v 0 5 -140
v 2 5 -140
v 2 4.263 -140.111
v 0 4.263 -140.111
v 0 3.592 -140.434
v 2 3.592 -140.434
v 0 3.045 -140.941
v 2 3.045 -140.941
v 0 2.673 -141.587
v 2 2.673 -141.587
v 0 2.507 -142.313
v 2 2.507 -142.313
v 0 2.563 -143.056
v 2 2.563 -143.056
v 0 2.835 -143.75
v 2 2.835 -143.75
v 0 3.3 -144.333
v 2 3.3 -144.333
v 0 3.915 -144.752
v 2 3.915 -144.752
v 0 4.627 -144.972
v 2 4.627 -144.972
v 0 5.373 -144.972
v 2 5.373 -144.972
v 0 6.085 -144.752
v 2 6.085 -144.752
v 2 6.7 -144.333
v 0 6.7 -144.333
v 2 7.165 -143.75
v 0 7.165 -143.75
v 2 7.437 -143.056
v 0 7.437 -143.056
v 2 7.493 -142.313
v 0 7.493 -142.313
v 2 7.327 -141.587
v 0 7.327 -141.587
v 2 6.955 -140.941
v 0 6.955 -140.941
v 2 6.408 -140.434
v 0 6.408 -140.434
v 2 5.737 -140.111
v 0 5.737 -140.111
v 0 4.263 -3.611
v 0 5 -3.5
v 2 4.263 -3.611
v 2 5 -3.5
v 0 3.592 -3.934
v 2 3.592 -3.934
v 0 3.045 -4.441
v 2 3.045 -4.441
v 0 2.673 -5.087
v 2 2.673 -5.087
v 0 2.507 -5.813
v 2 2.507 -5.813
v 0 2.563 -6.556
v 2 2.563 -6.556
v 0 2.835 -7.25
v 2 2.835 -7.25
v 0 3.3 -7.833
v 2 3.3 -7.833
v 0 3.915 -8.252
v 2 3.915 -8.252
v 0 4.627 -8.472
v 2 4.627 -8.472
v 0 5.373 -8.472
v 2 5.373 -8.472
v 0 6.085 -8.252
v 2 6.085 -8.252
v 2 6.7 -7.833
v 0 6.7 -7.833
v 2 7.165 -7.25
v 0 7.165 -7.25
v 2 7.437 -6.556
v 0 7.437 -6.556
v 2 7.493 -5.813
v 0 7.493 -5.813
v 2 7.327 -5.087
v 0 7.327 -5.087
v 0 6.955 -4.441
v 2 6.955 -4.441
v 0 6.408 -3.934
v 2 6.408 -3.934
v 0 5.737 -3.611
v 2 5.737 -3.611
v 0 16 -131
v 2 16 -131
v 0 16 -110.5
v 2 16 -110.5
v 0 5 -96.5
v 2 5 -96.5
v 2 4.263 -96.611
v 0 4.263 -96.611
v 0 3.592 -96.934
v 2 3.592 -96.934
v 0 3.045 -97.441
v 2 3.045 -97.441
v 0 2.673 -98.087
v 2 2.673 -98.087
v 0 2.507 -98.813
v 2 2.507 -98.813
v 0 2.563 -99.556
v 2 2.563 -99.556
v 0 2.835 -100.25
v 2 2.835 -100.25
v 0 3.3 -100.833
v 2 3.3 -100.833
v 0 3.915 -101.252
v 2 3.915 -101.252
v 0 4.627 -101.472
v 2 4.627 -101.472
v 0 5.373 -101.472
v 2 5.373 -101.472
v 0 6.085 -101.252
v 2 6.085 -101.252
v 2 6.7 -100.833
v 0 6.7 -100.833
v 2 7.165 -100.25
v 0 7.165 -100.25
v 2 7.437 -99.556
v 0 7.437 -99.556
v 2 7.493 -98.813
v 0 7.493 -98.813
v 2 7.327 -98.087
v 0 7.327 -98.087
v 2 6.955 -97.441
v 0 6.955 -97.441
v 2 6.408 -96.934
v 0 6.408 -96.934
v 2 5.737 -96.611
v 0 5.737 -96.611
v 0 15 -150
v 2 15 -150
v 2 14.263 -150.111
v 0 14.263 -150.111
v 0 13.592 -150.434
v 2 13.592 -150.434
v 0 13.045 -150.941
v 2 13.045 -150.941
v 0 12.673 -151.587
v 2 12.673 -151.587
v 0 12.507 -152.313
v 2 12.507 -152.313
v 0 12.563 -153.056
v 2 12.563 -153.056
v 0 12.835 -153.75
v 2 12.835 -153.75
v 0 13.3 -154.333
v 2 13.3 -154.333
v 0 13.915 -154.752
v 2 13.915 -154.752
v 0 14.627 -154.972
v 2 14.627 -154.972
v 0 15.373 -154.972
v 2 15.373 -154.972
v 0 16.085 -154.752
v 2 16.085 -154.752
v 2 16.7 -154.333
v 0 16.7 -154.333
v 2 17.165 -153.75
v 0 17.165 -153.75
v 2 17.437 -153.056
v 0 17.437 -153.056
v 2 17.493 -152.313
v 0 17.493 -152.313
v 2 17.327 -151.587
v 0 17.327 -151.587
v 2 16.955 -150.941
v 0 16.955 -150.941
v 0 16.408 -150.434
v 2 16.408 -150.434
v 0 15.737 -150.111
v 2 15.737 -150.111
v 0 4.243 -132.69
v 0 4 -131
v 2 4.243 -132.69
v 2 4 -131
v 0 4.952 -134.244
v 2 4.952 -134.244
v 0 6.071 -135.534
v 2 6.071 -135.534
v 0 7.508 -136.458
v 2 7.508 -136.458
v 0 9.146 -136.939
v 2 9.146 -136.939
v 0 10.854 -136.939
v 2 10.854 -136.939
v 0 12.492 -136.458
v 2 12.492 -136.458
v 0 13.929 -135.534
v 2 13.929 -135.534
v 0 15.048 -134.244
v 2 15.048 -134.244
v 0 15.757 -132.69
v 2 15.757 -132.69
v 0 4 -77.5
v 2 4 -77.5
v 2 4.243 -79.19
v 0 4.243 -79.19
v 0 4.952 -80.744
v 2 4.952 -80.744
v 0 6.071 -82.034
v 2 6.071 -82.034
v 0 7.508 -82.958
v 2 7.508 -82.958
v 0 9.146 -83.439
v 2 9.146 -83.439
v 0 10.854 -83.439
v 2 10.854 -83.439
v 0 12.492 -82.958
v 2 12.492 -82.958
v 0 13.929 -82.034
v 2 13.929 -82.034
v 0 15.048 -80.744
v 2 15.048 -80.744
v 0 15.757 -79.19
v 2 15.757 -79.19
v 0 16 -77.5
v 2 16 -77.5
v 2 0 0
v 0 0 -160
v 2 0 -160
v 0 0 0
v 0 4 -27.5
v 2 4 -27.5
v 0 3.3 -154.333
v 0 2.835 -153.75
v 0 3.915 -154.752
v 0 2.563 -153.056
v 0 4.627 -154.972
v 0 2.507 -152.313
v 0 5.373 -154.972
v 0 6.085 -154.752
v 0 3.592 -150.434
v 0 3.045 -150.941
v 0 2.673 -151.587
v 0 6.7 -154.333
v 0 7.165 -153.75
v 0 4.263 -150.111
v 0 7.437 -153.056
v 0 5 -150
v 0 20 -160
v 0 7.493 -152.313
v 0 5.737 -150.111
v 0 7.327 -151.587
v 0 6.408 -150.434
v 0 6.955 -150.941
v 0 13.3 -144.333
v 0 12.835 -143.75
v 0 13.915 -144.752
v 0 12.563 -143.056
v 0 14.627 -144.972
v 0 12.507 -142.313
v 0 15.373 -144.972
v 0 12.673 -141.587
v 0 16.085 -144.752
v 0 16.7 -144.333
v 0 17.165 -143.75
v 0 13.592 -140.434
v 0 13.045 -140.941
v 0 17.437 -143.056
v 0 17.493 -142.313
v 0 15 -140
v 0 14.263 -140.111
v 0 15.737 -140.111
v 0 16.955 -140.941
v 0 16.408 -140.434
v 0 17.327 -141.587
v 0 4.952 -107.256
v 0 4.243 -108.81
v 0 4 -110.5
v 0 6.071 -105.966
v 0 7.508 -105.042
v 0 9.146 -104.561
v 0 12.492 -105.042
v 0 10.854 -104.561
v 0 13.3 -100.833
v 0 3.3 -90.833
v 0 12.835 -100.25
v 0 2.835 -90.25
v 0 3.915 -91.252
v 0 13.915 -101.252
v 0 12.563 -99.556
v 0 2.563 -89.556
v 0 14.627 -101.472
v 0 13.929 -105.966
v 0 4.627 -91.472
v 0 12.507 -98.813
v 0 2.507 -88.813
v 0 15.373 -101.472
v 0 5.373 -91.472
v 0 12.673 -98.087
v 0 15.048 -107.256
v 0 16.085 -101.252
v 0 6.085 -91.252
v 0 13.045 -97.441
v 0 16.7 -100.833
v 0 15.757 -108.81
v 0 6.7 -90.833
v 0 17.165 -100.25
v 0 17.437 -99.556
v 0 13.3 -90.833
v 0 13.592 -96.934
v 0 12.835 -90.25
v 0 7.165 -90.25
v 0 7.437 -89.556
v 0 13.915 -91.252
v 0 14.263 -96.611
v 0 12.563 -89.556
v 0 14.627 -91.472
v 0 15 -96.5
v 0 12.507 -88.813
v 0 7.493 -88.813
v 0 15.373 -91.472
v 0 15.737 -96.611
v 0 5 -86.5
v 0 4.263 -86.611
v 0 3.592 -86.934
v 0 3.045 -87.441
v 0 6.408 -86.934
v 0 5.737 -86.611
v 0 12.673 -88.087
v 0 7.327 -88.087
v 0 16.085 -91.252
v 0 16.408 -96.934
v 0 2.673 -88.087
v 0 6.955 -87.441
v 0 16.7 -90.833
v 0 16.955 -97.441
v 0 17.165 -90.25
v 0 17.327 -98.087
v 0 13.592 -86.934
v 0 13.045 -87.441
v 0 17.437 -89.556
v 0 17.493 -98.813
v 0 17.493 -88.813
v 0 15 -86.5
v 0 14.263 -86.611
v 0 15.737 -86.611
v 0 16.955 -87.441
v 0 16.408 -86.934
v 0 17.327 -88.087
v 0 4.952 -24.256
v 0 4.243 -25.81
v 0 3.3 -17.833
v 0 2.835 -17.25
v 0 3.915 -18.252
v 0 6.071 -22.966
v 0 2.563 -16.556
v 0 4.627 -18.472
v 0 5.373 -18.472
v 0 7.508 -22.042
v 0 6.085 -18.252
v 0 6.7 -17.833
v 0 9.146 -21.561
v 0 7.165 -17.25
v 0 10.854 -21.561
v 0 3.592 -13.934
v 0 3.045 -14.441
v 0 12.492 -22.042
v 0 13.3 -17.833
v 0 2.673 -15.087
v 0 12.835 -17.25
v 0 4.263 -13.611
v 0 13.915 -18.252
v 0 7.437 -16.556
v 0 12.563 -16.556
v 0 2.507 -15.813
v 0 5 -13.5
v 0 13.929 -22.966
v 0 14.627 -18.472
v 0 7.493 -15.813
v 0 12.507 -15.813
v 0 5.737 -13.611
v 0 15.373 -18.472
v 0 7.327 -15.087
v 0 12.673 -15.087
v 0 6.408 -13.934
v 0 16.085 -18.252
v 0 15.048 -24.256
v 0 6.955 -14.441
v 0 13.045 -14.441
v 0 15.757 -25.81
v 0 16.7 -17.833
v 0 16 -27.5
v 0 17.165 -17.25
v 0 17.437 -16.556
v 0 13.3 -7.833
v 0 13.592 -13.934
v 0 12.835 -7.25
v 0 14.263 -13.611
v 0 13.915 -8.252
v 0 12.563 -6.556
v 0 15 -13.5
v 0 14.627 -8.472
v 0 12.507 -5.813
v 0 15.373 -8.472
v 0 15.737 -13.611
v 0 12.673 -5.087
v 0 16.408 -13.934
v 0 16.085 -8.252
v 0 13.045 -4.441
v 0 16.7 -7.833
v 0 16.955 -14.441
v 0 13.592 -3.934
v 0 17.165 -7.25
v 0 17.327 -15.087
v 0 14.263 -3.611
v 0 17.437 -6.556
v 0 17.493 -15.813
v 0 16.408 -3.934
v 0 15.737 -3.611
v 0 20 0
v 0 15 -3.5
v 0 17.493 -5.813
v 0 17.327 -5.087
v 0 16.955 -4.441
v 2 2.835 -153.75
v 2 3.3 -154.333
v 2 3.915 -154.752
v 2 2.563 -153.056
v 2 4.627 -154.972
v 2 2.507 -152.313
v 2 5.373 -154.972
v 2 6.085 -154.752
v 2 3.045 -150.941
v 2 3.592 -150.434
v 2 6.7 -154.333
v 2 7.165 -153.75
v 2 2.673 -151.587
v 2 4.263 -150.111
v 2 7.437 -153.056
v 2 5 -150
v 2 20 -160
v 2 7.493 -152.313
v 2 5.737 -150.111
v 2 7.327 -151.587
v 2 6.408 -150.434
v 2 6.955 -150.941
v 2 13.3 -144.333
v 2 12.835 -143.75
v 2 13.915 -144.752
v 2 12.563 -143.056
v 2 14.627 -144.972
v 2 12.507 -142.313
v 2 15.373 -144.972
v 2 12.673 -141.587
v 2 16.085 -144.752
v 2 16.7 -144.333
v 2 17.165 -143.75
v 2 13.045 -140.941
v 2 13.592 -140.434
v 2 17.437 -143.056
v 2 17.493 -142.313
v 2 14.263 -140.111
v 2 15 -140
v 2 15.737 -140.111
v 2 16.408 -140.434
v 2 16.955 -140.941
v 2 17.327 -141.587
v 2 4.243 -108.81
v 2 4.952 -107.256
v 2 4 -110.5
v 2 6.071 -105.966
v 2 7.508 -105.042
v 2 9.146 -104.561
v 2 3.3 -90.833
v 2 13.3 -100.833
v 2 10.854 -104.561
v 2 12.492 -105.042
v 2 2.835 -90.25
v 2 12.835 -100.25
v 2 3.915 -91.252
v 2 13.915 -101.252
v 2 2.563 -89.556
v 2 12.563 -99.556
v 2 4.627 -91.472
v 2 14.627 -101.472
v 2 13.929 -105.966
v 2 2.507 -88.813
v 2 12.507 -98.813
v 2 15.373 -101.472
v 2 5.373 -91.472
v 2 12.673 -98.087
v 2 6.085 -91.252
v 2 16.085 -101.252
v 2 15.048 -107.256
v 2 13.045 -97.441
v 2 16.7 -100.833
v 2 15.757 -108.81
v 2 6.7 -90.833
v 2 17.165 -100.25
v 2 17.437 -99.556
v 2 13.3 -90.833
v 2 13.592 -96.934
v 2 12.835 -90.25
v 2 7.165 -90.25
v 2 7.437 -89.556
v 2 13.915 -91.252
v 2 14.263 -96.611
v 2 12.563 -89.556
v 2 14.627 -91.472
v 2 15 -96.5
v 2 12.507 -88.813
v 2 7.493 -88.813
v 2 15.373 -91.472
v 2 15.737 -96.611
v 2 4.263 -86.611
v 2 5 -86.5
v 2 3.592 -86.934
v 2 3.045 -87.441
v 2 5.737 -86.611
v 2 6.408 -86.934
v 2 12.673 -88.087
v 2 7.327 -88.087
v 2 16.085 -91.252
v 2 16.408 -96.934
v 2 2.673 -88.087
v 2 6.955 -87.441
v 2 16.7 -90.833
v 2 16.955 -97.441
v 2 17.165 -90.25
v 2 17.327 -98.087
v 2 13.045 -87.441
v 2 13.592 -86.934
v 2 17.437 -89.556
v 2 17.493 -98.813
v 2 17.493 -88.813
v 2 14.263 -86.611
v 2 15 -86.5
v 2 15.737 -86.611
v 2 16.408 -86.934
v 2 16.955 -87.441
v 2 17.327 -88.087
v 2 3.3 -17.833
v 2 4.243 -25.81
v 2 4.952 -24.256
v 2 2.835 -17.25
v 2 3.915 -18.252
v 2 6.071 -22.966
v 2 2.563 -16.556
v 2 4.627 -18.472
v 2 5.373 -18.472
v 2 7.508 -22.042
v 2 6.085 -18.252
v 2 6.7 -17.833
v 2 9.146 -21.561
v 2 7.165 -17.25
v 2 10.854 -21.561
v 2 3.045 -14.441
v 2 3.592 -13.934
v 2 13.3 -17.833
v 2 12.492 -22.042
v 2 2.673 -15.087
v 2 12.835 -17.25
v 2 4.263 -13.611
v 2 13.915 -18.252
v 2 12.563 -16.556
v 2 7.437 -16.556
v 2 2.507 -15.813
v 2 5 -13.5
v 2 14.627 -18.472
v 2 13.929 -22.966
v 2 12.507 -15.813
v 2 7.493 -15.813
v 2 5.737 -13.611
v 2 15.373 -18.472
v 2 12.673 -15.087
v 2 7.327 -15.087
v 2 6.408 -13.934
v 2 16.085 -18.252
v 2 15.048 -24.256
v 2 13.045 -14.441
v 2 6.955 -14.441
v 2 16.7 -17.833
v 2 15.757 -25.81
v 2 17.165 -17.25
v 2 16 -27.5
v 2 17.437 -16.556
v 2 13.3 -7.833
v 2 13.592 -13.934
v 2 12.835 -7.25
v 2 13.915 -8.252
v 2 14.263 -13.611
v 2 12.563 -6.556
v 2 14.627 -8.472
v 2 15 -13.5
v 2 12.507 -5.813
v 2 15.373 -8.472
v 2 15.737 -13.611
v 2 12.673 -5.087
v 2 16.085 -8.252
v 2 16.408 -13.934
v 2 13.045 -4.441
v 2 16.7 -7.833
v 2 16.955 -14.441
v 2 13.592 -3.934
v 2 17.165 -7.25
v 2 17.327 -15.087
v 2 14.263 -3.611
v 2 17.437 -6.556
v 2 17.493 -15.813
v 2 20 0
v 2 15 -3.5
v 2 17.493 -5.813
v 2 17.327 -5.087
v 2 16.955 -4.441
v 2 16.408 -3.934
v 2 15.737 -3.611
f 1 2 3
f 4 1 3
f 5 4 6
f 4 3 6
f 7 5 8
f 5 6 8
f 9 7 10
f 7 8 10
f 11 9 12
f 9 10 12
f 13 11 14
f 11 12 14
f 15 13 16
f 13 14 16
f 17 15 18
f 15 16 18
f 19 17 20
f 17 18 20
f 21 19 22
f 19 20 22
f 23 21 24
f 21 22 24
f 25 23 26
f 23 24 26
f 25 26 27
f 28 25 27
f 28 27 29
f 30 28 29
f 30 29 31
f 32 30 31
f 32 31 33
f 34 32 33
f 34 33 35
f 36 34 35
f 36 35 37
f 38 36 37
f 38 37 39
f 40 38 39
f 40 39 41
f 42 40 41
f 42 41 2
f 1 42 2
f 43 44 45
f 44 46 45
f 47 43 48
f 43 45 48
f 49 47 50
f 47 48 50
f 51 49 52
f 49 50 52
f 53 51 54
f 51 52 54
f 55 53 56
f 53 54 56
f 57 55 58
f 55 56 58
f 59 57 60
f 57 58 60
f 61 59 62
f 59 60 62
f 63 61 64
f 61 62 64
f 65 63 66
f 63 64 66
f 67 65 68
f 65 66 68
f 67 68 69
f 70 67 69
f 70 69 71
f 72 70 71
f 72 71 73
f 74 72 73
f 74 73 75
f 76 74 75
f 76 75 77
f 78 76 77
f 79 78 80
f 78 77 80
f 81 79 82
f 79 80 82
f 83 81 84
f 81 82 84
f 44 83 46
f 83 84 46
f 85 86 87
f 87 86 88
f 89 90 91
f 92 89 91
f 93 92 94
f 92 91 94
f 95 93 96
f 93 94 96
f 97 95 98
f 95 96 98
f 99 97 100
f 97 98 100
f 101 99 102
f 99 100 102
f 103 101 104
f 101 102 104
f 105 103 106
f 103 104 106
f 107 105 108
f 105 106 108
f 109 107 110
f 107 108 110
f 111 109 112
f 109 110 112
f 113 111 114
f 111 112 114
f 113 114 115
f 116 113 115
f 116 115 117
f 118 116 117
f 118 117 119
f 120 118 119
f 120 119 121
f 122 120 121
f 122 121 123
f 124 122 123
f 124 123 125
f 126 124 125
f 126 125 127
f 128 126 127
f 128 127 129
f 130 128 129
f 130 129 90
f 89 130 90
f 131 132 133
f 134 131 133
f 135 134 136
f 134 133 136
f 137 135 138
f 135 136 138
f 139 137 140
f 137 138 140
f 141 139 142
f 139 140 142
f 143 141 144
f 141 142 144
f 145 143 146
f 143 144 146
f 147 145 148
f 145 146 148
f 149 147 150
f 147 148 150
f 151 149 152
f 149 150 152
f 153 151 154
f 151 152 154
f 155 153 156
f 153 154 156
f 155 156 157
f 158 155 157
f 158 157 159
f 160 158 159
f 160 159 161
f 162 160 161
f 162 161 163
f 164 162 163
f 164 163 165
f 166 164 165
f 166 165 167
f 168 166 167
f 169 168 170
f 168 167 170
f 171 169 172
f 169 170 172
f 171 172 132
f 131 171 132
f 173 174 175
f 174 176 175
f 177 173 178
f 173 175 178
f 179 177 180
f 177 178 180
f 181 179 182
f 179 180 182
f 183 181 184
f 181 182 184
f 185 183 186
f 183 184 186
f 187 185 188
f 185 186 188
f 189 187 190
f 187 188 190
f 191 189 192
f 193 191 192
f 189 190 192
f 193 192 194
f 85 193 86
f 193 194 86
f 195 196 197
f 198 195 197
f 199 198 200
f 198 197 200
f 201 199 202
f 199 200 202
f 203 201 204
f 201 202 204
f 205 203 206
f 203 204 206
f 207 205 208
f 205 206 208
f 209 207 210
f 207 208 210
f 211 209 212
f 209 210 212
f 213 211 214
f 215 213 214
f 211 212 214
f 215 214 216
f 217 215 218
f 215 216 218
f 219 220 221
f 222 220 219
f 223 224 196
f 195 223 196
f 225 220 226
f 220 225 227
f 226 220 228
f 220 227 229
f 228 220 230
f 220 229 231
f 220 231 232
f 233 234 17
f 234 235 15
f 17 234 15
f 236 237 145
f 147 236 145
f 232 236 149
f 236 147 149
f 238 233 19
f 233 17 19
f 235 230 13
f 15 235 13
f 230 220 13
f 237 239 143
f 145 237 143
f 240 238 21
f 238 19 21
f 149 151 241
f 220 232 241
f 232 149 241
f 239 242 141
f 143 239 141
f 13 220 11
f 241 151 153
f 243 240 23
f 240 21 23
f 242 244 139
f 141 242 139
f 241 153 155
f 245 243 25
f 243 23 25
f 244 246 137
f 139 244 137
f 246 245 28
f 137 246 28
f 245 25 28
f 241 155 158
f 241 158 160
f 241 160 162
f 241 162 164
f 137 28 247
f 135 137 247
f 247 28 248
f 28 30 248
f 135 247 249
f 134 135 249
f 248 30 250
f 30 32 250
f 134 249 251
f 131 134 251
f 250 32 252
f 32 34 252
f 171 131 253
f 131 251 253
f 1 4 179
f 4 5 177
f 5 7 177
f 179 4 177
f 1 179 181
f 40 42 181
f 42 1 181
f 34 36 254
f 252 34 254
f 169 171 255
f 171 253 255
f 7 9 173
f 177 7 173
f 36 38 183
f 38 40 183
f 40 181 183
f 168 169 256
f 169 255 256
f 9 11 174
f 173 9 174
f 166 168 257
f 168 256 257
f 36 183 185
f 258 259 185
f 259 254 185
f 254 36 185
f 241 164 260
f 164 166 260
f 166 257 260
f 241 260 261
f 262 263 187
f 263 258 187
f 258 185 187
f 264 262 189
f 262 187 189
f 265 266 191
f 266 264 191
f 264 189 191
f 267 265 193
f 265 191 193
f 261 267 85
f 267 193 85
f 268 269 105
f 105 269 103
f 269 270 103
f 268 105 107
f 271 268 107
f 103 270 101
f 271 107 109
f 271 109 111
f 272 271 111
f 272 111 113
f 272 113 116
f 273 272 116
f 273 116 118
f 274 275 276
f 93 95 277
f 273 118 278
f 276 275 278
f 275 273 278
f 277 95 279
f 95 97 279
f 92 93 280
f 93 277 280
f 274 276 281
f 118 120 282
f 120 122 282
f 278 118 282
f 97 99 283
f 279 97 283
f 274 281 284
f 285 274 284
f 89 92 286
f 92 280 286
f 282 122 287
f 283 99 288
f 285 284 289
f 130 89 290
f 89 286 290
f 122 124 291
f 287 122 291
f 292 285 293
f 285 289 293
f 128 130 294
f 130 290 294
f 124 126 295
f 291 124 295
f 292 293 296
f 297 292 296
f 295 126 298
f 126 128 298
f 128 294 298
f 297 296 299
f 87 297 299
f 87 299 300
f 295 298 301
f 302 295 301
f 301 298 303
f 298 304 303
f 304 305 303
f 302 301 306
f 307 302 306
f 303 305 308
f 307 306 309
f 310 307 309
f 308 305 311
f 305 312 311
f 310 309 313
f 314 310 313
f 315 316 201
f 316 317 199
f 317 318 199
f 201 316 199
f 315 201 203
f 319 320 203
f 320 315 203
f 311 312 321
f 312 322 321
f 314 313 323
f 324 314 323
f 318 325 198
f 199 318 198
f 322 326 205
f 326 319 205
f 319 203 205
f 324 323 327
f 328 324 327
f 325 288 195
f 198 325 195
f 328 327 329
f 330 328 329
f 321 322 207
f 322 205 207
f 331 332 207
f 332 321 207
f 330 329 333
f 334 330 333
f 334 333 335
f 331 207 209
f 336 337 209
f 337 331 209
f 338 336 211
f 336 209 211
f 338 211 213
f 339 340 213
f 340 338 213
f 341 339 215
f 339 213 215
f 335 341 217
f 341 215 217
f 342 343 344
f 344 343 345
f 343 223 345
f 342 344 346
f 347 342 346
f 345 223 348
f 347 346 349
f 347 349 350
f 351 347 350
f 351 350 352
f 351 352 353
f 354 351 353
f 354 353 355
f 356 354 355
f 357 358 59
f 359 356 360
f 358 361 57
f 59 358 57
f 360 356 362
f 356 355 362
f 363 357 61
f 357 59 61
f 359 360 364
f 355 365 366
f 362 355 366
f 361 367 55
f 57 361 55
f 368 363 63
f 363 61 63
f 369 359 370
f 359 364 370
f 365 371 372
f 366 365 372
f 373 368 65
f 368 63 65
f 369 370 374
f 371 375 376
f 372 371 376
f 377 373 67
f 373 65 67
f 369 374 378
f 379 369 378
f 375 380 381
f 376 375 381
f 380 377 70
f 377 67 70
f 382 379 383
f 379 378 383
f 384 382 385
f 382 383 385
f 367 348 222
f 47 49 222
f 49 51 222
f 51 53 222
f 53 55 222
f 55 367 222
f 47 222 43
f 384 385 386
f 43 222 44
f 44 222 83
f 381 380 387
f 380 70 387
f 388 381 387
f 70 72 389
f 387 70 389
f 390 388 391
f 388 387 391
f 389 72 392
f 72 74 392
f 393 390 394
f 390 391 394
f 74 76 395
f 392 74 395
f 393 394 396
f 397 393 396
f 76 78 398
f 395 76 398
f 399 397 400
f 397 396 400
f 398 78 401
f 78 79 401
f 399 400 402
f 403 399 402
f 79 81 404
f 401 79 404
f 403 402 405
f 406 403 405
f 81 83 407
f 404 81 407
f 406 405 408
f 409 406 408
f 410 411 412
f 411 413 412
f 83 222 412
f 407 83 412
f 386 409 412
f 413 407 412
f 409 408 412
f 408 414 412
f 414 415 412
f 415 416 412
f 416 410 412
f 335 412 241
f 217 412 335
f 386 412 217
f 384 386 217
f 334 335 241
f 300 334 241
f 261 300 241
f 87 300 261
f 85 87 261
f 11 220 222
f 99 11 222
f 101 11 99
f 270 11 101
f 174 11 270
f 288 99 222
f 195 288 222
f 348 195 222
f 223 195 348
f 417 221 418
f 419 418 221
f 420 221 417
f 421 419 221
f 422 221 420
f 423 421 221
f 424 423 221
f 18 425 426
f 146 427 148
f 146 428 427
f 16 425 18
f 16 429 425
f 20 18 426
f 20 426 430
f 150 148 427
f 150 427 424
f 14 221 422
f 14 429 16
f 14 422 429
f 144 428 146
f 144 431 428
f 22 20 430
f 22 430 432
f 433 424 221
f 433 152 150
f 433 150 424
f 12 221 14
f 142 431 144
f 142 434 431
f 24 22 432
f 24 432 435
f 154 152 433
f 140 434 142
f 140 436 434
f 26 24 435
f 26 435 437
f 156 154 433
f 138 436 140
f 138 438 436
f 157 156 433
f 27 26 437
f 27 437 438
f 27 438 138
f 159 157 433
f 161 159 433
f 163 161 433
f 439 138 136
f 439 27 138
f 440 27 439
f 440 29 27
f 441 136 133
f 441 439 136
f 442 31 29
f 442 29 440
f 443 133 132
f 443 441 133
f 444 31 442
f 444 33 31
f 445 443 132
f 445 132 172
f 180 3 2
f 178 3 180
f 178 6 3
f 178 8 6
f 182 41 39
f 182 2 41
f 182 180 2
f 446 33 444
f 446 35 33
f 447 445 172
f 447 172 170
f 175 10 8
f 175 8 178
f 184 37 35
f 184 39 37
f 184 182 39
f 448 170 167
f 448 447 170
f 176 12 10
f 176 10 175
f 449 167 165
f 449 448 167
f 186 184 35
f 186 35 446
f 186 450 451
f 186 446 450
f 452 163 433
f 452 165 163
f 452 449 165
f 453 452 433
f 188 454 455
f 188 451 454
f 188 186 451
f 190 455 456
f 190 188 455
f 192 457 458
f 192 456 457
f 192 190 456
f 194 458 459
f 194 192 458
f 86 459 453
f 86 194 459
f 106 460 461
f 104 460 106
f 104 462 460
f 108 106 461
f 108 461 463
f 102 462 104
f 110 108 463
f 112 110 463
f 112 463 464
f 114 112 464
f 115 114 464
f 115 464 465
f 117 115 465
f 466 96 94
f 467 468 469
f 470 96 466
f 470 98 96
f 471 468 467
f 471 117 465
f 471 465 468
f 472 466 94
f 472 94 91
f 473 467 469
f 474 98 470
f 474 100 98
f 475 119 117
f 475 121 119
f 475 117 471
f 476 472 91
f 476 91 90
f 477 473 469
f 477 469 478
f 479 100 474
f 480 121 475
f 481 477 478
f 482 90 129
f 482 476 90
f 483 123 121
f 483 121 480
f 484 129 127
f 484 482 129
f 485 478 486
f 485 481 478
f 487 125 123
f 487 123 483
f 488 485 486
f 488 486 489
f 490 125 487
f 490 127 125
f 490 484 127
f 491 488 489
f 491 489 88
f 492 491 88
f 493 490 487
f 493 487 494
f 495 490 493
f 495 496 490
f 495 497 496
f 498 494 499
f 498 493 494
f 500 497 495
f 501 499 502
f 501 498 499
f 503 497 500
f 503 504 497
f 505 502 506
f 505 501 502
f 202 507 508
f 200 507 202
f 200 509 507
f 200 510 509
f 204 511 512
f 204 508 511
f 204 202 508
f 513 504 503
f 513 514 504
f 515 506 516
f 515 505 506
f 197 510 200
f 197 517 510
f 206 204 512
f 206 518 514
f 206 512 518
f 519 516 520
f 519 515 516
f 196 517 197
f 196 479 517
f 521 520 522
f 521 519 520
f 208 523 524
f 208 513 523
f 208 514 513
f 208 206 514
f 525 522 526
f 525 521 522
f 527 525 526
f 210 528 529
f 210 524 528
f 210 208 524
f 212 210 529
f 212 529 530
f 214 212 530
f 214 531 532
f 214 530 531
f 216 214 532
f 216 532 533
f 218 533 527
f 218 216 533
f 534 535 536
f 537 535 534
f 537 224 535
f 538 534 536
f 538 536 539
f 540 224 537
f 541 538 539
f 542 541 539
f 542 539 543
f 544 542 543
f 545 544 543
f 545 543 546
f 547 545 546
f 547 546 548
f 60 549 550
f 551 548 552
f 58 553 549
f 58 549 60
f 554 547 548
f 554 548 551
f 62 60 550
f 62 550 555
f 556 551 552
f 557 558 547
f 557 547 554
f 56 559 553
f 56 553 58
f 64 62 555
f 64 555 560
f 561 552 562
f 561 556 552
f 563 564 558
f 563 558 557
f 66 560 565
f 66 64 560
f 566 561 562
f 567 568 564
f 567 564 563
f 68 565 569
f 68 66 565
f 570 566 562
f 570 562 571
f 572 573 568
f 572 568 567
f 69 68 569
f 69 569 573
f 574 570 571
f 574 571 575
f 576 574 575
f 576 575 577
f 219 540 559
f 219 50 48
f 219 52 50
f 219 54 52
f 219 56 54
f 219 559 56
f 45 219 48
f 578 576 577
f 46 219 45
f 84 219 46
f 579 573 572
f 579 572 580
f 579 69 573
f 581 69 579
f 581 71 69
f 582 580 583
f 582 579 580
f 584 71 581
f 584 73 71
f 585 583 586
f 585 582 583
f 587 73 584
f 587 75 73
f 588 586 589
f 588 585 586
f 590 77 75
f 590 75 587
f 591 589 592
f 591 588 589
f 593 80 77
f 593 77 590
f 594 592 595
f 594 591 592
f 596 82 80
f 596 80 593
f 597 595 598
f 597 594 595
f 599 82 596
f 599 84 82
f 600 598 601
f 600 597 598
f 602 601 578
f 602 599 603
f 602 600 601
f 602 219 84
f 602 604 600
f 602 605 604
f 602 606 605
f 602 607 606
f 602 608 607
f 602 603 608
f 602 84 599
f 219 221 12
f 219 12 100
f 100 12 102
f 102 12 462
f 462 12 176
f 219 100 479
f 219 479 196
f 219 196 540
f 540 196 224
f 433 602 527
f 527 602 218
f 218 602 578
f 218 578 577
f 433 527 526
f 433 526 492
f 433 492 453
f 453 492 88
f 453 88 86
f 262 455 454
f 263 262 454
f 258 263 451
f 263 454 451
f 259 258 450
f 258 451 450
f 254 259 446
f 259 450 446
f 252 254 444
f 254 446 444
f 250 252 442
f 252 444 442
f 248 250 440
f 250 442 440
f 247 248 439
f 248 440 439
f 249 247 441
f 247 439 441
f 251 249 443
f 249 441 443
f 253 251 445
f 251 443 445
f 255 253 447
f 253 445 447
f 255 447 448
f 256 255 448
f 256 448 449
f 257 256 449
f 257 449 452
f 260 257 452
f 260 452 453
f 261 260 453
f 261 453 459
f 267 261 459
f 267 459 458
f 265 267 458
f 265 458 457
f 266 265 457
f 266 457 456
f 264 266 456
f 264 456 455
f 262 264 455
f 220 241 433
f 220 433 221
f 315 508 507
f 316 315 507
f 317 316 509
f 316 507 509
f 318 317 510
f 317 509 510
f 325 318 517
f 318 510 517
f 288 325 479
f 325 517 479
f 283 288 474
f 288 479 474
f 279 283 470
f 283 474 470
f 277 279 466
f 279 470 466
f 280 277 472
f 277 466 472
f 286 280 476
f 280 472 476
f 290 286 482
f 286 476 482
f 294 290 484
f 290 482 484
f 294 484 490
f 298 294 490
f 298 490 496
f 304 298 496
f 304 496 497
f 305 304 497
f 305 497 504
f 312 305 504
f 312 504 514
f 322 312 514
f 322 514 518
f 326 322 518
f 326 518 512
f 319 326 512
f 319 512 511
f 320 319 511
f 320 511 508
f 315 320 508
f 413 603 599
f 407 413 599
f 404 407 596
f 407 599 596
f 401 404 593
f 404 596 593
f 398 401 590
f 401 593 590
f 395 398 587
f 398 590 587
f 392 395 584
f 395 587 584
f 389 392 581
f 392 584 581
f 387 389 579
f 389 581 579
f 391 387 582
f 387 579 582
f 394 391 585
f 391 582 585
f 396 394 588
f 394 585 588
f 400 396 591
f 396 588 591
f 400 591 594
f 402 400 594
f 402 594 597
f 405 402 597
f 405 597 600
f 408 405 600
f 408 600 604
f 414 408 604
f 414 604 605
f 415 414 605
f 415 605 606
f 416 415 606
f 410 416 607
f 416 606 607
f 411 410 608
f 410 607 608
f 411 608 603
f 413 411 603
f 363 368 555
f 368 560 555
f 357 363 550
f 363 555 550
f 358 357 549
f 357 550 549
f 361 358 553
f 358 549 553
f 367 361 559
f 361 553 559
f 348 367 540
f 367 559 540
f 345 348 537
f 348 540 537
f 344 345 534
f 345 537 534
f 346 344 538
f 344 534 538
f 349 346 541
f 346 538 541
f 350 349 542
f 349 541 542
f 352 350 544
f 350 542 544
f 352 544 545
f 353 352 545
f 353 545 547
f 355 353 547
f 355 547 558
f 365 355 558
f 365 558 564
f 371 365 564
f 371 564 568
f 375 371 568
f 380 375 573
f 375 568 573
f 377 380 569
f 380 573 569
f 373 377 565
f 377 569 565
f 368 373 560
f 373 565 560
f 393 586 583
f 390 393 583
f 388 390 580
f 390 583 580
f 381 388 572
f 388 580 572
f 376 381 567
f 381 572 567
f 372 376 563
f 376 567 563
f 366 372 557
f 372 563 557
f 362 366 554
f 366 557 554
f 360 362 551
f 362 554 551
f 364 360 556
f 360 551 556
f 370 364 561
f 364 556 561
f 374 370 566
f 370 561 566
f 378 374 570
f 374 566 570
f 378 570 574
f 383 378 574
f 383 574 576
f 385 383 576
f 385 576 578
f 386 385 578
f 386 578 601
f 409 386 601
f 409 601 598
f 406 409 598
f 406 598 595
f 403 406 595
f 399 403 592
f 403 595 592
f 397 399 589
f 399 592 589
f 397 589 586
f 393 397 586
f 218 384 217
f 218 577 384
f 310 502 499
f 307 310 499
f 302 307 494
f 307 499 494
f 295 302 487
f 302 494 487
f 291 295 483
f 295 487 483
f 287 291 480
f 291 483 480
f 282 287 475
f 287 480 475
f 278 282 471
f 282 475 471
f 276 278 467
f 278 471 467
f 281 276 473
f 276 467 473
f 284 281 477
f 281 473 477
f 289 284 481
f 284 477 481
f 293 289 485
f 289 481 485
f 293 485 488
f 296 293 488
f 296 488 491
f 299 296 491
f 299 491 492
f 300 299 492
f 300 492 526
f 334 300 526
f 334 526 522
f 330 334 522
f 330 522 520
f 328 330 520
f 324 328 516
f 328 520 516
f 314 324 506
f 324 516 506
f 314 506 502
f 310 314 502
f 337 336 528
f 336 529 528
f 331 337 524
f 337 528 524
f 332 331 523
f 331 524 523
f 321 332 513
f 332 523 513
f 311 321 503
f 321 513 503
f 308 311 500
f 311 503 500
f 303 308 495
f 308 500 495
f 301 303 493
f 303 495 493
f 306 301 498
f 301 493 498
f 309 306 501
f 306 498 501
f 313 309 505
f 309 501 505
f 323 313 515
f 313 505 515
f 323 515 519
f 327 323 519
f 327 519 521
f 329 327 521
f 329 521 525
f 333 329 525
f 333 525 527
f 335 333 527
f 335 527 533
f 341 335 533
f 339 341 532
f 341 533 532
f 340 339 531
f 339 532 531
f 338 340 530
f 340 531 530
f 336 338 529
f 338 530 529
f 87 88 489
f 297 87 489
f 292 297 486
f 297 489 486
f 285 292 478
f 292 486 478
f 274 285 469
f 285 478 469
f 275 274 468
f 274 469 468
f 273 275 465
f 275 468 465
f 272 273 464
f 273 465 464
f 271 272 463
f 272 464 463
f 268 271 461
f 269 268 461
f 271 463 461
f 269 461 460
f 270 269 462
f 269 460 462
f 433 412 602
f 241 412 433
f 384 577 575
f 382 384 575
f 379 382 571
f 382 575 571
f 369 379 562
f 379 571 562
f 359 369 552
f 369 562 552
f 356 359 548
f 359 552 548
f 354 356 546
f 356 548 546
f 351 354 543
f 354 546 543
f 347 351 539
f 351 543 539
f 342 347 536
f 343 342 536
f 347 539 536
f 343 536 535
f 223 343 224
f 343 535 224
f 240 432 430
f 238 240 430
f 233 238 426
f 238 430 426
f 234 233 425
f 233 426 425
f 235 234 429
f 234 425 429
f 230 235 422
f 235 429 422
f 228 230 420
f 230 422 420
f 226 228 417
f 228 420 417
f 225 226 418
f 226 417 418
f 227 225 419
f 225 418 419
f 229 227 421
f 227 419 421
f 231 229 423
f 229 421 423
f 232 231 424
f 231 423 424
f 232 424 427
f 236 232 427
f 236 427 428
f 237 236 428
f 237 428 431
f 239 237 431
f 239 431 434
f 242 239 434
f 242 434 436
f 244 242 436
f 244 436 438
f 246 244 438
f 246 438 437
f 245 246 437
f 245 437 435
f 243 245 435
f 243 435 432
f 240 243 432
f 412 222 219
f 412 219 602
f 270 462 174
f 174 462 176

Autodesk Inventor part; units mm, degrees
ref_plane "YZ Plane" through (0, 0, 0) normal (1, 0, 0) x (0, 1, 0)
ref_plane "XZ Plane" through (0, 0, 0) normal (0, 1, 0) x (-1, 0, 0)
ref_plane "XY Plane" through (0, 0, 0) normal (0, 0, 1) x (1, 0, 0)
sketch "Sketch1" plane through (0, 0, 0) normal (1, 0, 0) x (0, 1, 0)
  line L0 (0, 0) -> (20, 0)
  line L1 (20, 0) -> (20, -160)
  line L2 (20, -160) -> (0, -160)
  line L3 (0, -160) -> (0, 0)
  line L4 (10, 0) -> (10, -160) construction
  line L5 (20, -6) -> (0, -6) construction
  line L6 (20, -16) -> (0, -16) construction
  line L7 (20, -142.5) -> (0, -142.5) construction
  line L8 (25, -152.5) -> (0, -152.5) construction
  line L9 (20, -89) -> (0, -89) construction
  line L10 (25, -99) -> (0, -99) construction
  point P0 (15, -16)
  point P1 (15, -6)
  point P2 (5, -16)
  point P3 (5, -6)
  point P4 (15, -152.5)
  point P5 (15, -142.5)
  point P6 (5, -142.5)
  point P7 (5, -152.5)
  point P8 (15, -99)
  point P9 (15, -89)
  point P10 (5, -89)
  point P11 (5, -99)
  dimension "d1" = 20
  dimension "d10" = 6
  dimension "d11" = 10
  dimension "d12" = 10
  dimension "d13" = 10
  dimension "d14" = 10
  dimension "d16" = 10
  dimension "d17" = 10
  dimension "d27" = 10
  dimension "d28" = 10
  dimension "d29" = 10
  dimension "d30" = 89
  dimension "d40" = 142.5
  dimension "d41" = 160
extrude "Extrusion1" add sketch "Sketch1" along normal blind 2
hole "Hole1" at (0, 15, -16) at (0, 15, -6) at (0, 5, -16) at (0, 5, -6) at (0, 15, -142.5) at (0, 15, -152.5) at (0, 5, -152.5) at (0, 5, -142.5) at (0, 15, -89) at (0, 15, -99) at (0, 5, -99) at (0, 5, -89) direction (1, 0, 0) diameter 5 end through all
sketch "Sketch2" plane through (2, 0, 0) normal (1, 0, 0) x (0, 0, -1)
  arc A0 (27.5, 16) -> (27.5, 4) centre (27.5, 10) ccw
  line L0 (27.5, 10) -> (27.5, 4) construction
  line L1 (27.5, 10) -> (27.5, 16) construction
  line L2 (0, 20) -> (0, 0) projected
  line L3 (0, 10) -> (160, 10) construction
  line L4 (160, 0) -> (160, 20) projected
  line L5 (27.5, 16) -> (77.5, 16)
  line L6 (27.5, 4) -> (77.5, 4)
  circle A1 centre (89, 15) radius 2.5 construction
  circle A2 centre (89, 5) radius 2.5 construction
  line L7 (89, 15) -> (89, 5) construction
  circle A3 centre (16, 15) radius 2.5 construction
  circle A4 centre (16, 5) radius 2.5 construction
  line L8 (16, 15) -> (16, 5) construction
  circle A5 centre (99, 15) radius 2.5 construction
  line L9 (99, 15) -> (89, 15) construction
  line L10 (94, 15) -> (94, -7.3428) construction
  arc A6 (77.5, 4) -> (77.5, 16) centre (77.5, 10) ccw
  line L11 (77.5, 10) -> (77.5, 4) construction
  line L12 (77.5, 10) -> (77.5, 16) construction
  line L13 (110.5, 4) -> (131, 4)
  line L14 (131, 16) -> (110.5, 16)
  arc A7 (110.5, 16) -> (110.5, 4) centre (110.5, 10) ccw
  arc A8 (131, 4) -> (131, 16) centre (131, 10) ccw
  circle A9 centre (99, 5) radius 2.5 construction
  circle A10 centre (16, 15) radius 2.5 construction
  circle A11 centre (142.5, 5) radius 2.5 construction
  dimension "d31" = 180
  dimension "d32" = 6
  dimension "d33" = 50
  dimension "d34" = 73
  dimension "d36" = 180
  dimension "d42" = 6
  dimension "d43" = 6
  dimension "d44" = 20.5
  dimension "d46" = 180
  dimension "d47" = 5
  dimension "d48" = 11.5
  dimension "d49" = 43.5
  dimension "d50" = 11.5
extrude "Extrusion2" cut sketch "Sketch2" against normal blind 10
equation "\"d13\" = d12"
equation "\"d16\" = d12"
equation "\"d17\" = d12"
equation "\"d28\" = d27"
equation "\"d29\" = d12"
equation "\"d42\" = d32"
equation "\"d43\" = d32"
equation "\"d46\" = d36"
equation "\"d48\" = 0 * d47 + 0.5 * d34 - 0.5 * d33"
equation "\"d50\" = -0.5 * d44 + 0.5 * d49 + 0 * d47"
properties part number "sideLongitudinal" material "Steel"
